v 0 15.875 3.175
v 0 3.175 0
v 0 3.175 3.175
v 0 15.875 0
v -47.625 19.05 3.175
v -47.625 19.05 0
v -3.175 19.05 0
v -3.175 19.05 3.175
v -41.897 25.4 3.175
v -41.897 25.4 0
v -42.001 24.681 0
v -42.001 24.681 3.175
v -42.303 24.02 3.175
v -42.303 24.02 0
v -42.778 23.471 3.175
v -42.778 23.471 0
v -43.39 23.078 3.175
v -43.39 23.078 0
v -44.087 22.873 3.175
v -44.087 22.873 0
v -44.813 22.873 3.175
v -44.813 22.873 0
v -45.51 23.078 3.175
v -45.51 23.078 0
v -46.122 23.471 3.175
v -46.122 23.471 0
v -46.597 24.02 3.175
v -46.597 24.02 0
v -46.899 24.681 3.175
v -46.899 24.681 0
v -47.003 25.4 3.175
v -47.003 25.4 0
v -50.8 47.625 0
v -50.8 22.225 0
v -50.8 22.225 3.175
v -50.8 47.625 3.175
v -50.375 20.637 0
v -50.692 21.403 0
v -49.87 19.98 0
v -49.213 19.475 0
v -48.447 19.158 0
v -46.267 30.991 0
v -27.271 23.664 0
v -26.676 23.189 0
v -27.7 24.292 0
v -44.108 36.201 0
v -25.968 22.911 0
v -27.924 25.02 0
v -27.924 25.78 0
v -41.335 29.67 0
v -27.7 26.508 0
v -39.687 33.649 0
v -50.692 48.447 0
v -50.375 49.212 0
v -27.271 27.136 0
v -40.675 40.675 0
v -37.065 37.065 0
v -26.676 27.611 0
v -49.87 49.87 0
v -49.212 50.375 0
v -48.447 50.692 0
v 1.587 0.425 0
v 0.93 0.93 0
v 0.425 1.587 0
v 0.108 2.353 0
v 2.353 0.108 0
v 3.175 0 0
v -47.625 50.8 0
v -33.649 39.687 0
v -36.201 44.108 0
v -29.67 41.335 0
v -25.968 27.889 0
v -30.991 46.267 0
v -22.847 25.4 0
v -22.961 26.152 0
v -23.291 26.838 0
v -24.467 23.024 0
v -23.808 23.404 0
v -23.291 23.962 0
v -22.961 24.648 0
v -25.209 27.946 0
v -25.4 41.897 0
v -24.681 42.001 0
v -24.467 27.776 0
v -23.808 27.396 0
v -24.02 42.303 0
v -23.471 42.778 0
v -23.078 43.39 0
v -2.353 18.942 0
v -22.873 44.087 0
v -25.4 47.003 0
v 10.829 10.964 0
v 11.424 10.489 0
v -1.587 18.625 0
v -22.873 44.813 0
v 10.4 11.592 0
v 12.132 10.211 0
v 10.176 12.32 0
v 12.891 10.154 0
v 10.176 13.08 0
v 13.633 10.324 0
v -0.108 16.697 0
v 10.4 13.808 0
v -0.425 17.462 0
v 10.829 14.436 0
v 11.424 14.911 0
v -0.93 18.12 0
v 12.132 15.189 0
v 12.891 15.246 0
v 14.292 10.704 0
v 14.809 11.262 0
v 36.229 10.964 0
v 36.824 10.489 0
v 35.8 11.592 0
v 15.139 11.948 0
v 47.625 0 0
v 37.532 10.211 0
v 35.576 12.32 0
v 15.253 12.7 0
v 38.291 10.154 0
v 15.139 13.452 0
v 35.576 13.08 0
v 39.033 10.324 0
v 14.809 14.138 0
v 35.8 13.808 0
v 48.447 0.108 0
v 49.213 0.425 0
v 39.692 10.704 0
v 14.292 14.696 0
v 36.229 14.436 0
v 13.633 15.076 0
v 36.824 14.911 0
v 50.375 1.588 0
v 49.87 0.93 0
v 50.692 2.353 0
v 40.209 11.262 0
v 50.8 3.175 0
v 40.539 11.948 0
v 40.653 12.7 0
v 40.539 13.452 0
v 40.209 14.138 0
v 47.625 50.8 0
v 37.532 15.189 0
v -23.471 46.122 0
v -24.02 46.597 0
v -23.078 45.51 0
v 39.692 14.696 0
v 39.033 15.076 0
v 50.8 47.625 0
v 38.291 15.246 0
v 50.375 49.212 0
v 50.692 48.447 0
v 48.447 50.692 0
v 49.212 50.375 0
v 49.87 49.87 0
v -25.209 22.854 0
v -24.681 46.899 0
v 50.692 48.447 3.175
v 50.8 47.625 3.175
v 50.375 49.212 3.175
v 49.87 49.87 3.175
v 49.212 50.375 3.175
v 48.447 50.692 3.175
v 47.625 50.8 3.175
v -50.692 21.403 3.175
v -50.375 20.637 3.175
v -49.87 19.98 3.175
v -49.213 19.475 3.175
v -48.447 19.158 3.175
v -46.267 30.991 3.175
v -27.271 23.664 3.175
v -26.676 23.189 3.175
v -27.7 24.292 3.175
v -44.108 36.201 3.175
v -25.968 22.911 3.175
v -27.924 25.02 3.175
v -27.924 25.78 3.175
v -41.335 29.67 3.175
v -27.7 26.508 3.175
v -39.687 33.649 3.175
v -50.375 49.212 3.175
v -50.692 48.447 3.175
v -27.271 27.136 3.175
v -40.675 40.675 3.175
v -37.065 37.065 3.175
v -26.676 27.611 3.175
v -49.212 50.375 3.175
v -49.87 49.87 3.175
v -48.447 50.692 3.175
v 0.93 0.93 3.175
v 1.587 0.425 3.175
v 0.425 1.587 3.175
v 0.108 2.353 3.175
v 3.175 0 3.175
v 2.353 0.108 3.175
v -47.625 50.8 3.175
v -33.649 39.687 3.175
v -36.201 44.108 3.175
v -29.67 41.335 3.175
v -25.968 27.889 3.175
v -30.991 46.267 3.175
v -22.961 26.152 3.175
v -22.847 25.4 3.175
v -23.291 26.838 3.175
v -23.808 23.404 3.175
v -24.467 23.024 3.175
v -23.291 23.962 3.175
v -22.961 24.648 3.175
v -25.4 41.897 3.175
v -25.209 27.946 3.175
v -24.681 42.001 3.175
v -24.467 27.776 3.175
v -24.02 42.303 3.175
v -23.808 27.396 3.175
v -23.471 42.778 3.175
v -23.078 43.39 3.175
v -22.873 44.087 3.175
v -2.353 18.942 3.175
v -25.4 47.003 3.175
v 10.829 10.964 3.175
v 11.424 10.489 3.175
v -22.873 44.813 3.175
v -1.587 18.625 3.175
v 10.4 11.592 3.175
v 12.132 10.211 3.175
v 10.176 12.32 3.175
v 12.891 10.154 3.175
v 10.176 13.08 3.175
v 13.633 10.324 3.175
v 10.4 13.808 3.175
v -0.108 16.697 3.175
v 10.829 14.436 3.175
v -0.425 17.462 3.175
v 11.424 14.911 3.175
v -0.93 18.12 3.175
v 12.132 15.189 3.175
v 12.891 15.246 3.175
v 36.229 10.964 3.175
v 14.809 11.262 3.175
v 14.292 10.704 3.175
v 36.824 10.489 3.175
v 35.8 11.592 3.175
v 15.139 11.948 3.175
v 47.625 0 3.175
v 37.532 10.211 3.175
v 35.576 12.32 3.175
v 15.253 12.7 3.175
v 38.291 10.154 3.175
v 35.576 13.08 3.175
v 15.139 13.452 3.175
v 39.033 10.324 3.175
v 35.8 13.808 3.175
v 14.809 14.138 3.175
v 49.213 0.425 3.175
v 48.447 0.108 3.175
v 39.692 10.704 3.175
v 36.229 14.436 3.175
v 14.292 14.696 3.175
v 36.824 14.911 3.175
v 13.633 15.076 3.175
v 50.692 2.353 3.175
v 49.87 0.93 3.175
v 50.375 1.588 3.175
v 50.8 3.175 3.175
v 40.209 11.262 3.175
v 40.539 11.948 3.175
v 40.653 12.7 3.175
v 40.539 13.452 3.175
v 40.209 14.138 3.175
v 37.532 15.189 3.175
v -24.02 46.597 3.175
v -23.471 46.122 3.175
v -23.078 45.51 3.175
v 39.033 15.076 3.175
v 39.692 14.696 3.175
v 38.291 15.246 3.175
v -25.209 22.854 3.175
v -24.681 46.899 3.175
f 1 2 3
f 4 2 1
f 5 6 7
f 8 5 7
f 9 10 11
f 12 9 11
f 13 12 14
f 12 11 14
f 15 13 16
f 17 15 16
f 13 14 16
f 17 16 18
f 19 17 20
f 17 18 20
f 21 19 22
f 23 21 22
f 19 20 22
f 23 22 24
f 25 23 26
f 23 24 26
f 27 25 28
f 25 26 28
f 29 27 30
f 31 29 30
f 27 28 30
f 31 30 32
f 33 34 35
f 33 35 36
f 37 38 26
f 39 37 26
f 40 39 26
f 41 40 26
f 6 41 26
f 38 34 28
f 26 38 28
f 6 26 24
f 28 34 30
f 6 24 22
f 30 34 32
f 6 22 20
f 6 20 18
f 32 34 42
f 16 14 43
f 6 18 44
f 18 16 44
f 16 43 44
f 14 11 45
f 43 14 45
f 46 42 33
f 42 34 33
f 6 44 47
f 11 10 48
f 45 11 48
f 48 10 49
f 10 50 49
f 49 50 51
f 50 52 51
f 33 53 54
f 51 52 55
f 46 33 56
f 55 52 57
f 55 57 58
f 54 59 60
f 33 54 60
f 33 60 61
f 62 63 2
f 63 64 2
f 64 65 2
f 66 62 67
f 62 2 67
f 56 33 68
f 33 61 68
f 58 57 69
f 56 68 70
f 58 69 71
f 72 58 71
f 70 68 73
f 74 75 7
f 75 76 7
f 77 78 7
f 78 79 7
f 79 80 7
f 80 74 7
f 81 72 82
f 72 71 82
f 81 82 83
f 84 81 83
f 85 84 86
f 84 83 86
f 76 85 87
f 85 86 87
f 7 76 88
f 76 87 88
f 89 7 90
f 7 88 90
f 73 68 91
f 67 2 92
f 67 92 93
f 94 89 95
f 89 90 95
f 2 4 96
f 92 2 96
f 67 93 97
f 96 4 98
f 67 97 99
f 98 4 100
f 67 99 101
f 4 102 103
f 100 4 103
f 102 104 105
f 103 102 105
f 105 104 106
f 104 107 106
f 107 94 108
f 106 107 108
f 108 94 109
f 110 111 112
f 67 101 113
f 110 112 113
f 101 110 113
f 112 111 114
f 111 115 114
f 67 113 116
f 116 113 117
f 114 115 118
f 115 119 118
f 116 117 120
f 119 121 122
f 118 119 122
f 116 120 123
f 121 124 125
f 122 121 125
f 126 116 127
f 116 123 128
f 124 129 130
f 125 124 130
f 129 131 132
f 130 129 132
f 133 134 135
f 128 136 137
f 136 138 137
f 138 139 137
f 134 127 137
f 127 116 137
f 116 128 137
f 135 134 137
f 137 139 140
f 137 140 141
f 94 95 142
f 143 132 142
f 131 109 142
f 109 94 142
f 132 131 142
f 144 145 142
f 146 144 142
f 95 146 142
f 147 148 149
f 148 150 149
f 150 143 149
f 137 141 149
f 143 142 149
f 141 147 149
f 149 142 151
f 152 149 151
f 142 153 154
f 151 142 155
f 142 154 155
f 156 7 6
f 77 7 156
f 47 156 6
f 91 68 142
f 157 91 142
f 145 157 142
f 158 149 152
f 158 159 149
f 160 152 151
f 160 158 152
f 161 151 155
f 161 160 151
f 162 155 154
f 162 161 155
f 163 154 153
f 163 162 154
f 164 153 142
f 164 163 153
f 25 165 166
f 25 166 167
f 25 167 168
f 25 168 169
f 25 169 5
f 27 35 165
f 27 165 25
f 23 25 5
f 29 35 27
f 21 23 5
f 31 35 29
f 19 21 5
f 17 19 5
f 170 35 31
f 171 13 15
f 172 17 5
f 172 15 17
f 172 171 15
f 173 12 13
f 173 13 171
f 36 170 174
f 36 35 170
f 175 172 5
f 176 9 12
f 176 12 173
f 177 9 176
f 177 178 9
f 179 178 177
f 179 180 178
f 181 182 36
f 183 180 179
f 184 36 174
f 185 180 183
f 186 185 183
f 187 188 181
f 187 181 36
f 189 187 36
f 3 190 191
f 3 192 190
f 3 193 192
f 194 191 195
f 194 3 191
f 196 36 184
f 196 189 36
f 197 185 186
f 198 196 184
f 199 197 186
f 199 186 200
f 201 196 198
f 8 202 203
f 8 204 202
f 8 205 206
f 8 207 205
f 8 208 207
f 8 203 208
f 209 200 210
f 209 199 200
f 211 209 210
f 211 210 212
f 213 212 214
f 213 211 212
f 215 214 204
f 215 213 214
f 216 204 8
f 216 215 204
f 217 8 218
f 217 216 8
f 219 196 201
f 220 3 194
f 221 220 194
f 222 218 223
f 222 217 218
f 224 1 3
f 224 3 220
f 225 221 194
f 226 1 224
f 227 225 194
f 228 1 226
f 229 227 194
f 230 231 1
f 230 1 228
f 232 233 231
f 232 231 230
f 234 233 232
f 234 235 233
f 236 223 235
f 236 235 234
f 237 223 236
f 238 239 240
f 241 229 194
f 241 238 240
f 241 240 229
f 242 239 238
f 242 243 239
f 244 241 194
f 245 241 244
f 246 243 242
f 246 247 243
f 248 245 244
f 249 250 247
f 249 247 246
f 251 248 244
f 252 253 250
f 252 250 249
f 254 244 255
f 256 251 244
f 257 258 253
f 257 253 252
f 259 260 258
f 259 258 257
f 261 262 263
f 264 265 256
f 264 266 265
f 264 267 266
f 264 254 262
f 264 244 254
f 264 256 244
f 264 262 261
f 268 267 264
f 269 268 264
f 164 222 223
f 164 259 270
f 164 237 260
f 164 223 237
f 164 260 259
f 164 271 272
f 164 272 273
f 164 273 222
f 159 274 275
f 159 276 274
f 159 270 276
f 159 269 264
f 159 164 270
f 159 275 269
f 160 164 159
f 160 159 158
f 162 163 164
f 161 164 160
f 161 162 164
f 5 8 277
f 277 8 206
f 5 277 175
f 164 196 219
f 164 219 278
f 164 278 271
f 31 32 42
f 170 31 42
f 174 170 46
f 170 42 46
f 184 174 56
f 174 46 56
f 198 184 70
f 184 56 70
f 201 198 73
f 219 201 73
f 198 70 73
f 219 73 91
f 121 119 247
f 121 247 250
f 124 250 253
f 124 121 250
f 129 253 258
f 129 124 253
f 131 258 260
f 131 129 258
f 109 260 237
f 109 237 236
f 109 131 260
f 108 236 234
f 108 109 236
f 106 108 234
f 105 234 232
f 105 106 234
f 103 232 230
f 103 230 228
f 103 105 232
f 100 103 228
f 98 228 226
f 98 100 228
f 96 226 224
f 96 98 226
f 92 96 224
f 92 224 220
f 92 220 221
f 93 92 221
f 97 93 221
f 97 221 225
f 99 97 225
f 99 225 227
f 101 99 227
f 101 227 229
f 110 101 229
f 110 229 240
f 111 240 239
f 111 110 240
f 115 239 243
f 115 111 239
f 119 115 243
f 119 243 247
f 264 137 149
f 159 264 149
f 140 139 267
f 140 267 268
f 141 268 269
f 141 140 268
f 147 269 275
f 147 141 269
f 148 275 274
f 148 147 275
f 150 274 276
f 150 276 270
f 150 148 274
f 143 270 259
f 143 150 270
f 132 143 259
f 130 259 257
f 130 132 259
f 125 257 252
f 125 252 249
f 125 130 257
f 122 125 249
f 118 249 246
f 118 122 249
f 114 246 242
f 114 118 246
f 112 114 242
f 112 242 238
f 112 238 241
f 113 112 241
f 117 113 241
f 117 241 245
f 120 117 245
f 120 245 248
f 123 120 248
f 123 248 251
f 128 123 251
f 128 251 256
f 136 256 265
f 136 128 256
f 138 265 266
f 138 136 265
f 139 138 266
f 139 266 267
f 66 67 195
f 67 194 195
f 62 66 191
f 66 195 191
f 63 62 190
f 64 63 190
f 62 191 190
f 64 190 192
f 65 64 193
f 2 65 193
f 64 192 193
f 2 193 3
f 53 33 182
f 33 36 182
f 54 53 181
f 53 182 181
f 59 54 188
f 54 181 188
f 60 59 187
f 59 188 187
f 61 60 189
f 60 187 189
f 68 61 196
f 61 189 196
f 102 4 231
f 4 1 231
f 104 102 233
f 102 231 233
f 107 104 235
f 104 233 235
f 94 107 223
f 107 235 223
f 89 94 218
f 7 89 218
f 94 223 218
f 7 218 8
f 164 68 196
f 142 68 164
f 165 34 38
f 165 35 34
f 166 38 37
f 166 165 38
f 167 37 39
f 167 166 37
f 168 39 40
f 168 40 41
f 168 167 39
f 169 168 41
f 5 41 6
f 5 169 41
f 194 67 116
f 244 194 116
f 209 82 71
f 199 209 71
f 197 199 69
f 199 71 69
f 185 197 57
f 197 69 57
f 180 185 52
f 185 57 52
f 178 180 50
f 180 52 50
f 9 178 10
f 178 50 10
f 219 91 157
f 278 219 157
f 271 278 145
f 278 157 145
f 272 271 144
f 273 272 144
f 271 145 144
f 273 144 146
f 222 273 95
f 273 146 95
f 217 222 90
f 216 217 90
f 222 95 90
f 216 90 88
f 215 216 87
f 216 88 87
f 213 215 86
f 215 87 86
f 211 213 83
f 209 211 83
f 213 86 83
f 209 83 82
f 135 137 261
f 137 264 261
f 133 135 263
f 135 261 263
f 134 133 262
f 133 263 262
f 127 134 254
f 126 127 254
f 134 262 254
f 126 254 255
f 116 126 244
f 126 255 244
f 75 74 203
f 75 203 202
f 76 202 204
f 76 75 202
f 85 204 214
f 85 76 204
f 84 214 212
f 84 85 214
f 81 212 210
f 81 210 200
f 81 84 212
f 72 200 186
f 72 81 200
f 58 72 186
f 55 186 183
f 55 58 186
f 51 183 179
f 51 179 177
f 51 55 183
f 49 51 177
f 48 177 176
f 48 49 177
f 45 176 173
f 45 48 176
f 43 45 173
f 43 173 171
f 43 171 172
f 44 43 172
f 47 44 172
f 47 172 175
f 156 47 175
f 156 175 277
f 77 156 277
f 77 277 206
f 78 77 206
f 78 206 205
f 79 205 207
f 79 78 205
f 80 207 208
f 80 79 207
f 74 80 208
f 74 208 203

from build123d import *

# Parameters (mm, degrees)
SKETCH1_W           = 50.8
SKETCH1_H           = 50.8
SKETCH1_R           = 2.5527
SKETCH1_H_2         = 31.75
BOSS_EXTRUDE1_DEPTH = 3.175
FILLET1_R           = 3.175


with BuildPart() as part:
    # Sketch1 → Boss-Extrude1 (new body)
    # profile 1 of 2: a face of its own
    with BuildSketch(Plane.XY):
        with Locations((25.4, 25.4)):
            Rectangle(SKETCH1_W, SKETCH1_H)
        with Locations((38.1, 12.7)):
            Circle(SKETCH1_R, mode=Mode.SUBTRACT)
        with Locations((12.7, 12.7)):
            Circle(SKETCH1_R, mode=Mode.SUBTRACT)
    # profile 2 of 2: a face of its own
    with BuildSketch(Plane.XY):
        with Locations((-25.4, 34.925)):
            Rectangle(SKETCH1_W, SKETCH1_H_2)
        with Locations((-25.4, 25.4)):
            Circle(SKETCH1_R, mode=Mode.SUBTRACT)
        with BuildLine():
            ThreePointArc((-41.8973, 25.4), (-44.45, 22.8473), (-47.0027, 25.4))
            ThreePointArc((-47.0027, 25.4), (-40.675415662, 40.675415662), (-25.4, 47.0027))
            ThreePointArc((-25.4, 47.0027), (-22.8473, 44.45), (-25.4, 41.8973))
            ThreePointArc((-25.4, 41.8973), (-37.065352701, 37.065352701), (-41.8973, 25.4))
        make_face(mode=Mode.SUBTRACT)
    extrude(amount=BOSS_EXTRUDE1_DEPTH)

    # Fillet1
    fillet1_edges = [part.edges().sort_by_distance(p)[0] for p in [
        (0, 0, 1.5875),
        (0, 19.05, 1.5875),
        (-50.8, 19.05, 1.5875),
        (-50.8, 50.8, 1.5875),
        (50.8, 50.8, 1.5875),
        (50.8, 0, 1.5875),
    ]]
    fillet(fillet1_edges, radius=FILLET1_R)


solid = part.part
